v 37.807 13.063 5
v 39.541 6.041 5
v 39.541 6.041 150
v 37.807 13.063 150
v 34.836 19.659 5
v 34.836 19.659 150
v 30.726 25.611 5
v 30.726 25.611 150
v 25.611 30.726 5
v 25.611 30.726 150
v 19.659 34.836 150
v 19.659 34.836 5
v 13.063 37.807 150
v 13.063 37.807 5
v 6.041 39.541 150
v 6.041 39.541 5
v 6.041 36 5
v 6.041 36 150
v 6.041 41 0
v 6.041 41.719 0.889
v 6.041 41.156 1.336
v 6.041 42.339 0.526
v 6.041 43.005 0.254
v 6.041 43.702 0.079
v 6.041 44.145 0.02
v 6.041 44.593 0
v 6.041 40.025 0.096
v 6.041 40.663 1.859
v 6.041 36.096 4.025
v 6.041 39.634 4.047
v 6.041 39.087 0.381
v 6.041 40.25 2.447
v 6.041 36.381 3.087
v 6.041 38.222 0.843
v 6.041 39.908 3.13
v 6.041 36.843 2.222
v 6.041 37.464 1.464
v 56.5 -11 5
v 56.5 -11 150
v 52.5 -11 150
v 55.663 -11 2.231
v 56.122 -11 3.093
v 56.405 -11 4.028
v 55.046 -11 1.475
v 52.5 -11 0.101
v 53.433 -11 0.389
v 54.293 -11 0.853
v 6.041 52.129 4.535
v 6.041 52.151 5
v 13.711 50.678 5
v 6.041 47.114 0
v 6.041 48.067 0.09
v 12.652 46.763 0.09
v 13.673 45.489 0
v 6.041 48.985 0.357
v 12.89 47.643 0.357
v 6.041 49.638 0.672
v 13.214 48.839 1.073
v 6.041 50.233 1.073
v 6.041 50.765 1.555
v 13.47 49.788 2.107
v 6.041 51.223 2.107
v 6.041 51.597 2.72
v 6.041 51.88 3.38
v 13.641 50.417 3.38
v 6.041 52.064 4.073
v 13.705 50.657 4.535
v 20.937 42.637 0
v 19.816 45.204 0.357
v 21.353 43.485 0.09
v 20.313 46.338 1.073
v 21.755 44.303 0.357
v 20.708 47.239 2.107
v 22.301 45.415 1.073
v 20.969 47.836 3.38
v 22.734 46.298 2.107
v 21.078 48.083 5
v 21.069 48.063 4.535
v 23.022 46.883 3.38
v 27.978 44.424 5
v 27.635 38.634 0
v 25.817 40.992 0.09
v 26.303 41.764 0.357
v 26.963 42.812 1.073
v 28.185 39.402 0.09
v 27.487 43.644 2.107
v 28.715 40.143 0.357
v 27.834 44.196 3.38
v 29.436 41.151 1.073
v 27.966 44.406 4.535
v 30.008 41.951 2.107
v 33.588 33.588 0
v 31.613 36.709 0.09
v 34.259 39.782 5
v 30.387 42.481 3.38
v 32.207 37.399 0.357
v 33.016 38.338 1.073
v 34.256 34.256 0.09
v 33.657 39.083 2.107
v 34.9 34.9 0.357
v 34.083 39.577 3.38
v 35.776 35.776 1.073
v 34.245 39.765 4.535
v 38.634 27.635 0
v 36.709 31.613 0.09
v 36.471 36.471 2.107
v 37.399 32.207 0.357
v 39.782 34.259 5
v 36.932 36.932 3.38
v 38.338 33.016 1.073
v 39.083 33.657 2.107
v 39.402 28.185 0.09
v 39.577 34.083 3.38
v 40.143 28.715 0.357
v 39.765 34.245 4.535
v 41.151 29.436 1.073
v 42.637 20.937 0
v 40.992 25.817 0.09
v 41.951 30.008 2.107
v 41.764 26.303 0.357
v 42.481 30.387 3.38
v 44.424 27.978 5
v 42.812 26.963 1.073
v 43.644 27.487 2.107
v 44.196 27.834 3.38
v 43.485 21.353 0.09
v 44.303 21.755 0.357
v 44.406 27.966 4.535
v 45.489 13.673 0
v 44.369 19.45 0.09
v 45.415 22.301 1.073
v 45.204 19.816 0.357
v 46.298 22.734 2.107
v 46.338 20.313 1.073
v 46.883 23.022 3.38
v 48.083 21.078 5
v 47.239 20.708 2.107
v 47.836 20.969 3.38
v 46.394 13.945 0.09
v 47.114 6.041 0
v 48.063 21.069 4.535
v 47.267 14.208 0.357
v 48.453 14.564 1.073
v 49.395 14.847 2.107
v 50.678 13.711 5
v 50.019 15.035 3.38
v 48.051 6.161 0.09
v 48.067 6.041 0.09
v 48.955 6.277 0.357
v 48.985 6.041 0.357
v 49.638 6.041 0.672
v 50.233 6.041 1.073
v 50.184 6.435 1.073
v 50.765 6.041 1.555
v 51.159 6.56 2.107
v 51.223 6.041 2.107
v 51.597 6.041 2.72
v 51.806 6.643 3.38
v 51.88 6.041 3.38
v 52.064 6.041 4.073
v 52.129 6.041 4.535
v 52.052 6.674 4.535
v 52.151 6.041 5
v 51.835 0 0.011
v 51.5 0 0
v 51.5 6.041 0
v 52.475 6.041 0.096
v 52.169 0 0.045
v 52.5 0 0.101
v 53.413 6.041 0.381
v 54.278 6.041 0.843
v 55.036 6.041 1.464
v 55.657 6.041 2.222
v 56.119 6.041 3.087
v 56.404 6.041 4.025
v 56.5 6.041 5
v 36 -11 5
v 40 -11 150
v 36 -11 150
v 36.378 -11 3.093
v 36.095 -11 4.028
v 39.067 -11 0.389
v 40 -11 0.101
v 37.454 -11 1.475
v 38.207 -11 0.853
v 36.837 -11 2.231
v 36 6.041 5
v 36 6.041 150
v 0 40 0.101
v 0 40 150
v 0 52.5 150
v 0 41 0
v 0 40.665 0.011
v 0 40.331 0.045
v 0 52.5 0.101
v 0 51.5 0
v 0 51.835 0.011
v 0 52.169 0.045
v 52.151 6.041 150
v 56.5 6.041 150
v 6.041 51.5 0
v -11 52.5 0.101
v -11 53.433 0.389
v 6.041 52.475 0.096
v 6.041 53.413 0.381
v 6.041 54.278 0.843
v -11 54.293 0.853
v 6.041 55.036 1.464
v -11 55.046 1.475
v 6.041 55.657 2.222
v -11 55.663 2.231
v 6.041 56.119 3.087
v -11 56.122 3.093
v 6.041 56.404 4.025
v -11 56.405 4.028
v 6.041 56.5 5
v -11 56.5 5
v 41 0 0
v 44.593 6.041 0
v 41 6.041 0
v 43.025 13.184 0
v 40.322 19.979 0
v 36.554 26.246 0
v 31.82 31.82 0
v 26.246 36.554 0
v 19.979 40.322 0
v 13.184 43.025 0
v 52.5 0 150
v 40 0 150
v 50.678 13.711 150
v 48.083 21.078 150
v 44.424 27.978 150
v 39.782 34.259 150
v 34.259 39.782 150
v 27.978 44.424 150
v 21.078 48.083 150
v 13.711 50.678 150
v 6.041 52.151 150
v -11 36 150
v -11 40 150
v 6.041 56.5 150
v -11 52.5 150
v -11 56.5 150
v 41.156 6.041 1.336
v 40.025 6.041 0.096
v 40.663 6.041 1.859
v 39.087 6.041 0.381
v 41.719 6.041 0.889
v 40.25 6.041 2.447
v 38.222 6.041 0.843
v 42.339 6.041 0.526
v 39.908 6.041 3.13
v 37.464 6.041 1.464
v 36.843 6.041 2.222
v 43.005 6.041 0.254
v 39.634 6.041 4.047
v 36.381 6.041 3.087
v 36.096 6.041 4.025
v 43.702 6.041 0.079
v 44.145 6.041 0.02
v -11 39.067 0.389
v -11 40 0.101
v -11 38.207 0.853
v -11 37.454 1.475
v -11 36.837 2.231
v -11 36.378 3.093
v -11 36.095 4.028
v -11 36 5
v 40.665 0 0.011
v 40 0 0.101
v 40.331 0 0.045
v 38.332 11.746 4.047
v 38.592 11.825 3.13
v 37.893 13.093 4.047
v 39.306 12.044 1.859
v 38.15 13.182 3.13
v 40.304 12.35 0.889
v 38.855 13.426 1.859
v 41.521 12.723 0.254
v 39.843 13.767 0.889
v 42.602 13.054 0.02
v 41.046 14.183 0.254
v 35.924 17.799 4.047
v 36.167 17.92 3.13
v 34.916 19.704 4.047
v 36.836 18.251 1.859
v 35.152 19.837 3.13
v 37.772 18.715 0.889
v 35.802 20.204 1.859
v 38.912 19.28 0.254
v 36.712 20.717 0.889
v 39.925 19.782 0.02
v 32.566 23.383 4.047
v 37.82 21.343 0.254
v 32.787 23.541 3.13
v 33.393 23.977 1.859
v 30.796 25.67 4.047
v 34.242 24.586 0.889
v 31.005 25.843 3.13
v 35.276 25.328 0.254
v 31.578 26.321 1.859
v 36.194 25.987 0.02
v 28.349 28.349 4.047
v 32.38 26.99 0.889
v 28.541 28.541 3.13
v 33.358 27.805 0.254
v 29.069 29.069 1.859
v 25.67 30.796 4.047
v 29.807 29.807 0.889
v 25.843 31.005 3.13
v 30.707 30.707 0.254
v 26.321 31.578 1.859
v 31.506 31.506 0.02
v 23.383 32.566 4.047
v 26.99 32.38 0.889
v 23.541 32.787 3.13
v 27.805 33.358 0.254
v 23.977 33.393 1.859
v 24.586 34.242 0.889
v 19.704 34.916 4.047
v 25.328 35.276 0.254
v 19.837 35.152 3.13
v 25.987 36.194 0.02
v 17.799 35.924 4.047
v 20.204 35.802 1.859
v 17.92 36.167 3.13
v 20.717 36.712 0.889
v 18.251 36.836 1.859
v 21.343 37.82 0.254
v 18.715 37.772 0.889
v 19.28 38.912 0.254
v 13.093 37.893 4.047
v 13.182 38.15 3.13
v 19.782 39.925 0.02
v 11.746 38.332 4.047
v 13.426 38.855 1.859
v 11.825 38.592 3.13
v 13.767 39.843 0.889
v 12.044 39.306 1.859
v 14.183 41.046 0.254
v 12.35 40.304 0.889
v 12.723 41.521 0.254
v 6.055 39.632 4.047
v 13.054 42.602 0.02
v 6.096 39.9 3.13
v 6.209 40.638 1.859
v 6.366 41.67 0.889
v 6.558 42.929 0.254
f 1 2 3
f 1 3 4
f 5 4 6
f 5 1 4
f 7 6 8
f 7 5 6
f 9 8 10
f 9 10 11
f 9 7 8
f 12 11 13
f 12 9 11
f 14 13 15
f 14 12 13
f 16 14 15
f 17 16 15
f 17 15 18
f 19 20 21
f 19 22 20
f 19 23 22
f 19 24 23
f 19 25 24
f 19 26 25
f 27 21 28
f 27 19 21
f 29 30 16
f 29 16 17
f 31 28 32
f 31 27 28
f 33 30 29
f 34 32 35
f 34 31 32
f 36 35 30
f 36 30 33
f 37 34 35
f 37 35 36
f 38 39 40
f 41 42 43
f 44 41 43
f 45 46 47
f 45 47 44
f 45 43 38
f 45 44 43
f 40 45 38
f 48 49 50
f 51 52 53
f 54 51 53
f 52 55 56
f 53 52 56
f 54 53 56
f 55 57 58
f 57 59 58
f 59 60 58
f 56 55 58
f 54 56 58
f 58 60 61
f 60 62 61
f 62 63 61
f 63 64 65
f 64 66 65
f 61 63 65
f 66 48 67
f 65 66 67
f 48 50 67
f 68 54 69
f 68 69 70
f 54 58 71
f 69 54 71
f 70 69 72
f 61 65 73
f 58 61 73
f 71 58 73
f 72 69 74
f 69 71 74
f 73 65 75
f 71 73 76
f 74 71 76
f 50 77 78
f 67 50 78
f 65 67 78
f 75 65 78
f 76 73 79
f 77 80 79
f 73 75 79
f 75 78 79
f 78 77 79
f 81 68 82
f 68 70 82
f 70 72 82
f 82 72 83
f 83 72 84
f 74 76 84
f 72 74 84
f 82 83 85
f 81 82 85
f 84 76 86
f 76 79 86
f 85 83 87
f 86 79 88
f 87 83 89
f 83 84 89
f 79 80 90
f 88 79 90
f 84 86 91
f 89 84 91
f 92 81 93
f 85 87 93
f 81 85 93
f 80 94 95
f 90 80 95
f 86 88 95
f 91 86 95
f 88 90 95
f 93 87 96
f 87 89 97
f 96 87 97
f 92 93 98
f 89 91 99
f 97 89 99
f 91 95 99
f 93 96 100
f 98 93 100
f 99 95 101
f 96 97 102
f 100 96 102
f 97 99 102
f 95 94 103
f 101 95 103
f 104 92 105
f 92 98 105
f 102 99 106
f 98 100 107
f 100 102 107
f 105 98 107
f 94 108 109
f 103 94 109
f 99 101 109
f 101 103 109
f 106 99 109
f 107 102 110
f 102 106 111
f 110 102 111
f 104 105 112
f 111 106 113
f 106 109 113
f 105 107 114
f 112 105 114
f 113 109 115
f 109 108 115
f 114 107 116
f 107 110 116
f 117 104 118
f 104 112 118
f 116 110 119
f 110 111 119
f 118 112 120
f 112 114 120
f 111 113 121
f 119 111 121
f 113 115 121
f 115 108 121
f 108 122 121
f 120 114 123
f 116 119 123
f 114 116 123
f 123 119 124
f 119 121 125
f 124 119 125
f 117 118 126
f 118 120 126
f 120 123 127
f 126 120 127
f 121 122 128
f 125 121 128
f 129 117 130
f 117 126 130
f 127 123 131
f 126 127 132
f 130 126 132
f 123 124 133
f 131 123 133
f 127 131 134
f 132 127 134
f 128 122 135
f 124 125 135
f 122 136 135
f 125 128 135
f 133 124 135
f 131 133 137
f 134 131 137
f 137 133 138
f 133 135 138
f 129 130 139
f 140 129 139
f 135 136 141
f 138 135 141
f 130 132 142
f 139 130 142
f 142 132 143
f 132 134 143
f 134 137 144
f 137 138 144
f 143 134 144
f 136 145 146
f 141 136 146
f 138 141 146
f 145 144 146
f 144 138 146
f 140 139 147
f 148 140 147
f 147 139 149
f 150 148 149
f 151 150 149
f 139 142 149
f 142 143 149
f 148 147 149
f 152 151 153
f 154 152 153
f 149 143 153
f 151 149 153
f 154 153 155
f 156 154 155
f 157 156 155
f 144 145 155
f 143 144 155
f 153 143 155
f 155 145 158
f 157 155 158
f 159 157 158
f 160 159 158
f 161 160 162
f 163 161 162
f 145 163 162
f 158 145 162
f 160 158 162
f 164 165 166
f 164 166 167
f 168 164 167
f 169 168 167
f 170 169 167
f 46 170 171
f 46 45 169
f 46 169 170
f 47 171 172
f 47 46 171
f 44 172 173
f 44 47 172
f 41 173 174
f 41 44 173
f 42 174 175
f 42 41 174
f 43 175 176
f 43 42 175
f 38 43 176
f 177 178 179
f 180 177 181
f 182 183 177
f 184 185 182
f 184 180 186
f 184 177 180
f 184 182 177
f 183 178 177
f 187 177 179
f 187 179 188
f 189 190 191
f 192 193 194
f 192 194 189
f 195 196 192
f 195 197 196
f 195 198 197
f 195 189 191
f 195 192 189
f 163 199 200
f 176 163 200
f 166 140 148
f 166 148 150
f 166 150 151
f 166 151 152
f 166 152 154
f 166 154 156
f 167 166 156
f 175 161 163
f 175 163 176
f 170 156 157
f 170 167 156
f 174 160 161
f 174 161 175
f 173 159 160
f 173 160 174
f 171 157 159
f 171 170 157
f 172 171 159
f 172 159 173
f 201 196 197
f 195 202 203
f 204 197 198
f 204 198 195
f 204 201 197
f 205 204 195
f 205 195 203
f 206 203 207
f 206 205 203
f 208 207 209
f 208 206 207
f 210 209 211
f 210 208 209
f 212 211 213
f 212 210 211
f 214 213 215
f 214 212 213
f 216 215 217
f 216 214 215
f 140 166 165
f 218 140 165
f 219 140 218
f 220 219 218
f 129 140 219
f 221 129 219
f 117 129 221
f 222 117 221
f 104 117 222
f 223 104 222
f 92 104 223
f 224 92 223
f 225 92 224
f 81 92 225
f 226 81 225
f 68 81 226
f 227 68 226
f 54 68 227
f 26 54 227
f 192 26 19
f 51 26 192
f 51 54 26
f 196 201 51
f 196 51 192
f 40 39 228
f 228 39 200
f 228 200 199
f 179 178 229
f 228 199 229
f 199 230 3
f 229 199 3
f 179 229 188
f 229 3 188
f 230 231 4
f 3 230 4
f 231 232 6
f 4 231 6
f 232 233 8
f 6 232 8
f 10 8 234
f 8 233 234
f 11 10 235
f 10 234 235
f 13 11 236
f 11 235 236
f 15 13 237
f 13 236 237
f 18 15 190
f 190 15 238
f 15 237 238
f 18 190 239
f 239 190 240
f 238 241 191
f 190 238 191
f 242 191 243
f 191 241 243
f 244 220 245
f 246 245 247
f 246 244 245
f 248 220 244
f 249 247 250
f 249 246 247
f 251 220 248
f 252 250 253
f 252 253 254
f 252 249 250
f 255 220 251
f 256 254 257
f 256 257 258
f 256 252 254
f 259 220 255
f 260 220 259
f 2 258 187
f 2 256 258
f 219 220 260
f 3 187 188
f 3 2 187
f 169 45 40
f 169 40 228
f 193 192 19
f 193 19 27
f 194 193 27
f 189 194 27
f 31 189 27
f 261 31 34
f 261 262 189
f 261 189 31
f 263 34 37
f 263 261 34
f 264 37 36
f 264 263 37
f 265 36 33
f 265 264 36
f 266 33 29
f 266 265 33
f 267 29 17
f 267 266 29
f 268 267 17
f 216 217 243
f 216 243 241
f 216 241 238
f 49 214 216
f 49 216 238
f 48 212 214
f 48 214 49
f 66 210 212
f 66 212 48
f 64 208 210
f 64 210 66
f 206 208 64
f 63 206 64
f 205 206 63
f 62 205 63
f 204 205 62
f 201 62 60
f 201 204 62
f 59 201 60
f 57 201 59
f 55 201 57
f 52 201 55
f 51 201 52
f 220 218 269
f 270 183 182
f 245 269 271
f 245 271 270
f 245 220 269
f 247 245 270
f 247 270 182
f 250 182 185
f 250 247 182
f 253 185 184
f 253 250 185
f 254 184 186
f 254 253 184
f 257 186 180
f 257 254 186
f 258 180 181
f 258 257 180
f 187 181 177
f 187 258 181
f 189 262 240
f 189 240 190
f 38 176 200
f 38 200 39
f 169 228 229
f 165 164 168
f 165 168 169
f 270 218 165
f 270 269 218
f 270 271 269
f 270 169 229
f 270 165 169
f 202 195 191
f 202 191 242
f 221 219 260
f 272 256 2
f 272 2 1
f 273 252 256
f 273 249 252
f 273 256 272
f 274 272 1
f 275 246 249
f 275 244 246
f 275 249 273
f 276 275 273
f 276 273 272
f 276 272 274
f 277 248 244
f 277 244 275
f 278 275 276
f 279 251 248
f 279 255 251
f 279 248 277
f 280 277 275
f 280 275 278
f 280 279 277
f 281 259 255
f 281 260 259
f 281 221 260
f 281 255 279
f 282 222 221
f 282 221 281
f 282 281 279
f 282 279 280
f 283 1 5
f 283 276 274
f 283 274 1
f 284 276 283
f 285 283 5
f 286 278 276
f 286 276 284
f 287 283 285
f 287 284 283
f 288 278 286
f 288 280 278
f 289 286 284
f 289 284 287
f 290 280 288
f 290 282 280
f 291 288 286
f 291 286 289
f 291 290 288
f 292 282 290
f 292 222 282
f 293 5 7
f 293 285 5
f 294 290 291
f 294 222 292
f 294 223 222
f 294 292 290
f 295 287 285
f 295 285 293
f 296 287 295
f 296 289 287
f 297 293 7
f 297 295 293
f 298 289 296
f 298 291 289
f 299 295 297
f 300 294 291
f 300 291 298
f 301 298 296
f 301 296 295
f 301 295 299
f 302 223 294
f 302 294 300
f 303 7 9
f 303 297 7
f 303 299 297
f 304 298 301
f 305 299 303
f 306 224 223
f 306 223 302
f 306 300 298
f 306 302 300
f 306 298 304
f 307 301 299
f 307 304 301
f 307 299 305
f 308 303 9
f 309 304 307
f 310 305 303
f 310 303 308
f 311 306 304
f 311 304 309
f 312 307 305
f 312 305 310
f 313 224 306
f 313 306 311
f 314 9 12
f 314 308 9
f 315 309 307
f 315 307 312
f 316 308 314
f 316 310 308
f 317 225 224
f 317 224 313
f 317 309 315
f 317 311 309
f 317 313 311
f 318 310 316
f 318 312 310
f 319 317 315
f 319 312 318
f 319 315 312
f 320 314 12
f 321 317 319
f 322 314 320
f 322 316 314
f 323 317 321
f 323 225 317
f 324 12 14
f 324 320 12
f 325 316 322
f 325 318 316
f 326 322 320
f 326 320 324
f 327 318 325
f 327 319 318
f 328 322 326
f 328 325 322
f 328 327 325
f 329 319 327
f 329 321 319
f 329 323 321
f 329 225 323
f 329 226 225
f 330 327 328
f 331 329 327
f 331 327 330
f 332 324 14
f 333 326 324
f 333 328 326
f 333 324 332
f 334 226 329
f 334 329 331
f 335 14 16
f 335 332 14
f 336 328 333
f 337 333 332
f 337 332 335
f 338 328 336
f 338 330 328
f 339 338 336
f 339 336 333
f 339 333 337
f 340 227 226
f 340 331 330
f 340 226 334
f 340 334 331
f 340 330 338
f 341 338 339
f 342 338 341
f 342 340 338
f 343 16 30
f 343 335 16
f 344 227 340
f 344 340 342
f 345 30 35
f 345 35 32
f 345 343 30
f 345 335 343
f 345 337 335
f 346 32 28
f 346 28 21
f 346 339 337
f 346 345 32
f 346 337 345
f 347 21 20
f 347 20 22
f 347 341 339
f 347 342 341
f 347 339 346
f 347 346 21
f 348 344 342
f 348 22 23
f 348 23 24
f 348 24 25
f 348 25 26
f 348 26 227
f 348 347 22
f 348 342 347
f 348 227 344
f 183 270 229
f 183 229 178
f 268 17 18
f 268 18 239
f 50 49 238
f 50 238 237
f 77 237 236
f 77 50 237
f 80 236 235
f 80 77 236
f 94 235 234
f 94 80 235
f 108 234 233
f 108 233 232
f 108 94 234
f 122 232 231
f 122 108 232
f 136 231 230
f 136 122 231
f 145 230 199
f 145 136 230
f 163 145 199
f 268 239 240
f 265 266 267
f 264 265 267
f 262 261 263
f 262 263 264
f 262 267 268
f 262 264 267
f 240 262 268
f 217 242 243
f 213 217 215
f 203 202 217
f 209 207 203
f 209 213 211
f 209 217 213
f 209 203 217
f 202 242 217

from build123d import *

# Parameters (mm, degrees)
EXTRUDE_1_DEPTH = 150
EXTRUDE_2_DEPTH = 150
FILLET_1_R      = 5
FILLET_2_R      = 5
FILLET_3_R      = 5
FILLET_4_R      = 5
FILLET_5_R      = 5


with BuildPart() as part:
    # 草图1 → 凸台-拉伸1 (new body)
    with BuildSketch(Plane.XY):
        with BuildLine():
            Line((0, 40), (0, 52.5))
            ThreePointArc((0, 52.5), (37.123106012, 37.123106012), (52.5, 0))
            Line((52.5, 0), (40, 0))
            ThreePointArc((40, 0), (28.284271247, 28.284271247), (0, 40))
        make_face()
    extrude(amount=EXTRUDE_1_DEPTH)

    # 草图2 → 凸台-拉伸2 (add)
    with BuildSketch(Plane(origin=(0, 0, 0), x_dir=(-1, 0, 0), z_dir=(0, 0, -1))):
        Polygon((11, 52.5), (11, 56.5), (-6.040960951, 56.5), (-6.040960951, 36), (11, 36), (11, 40), (0, 40), (0, 52.5), align=None)
        Polygon((-52.5, -11), (-52.5, 0), (-40, 0), (-40, -11), (-36, -11), (-36, 6.040960951), (-56.5, 6.040960951), (-56.5, -11), align=None)
    extrude(amount=-EXTRUDE_2_DEPTH)

    # 圆角1
    fillet_1_edges = [part.edges().sort_by_distance(p)[0] for p in [
        (37.123106012, 37.123106012, 0),
    ]]
    fillet(fillet_1_edges, radius=FILLET_1_R)

    # 圆角2
    # the kernel refuses this fillet: 5 mm, written as the material it takes off along each edge
    with BuildSketch(Plane(origin=(0, 0, 0), x_dir=(0.9870710552033948, -0.1602832866510314, 0), z_dir=(-0.1602832866510314, -0.9870710552033948, 0))) as fillet_2_piece_1_section:
        with BuildLine():
            CenterArc((40 + FILLET_2_R, FILLET_2_R), FILLET_2_R, 180, 90)
            Line((40, FILLET_2_R), (40, 0))
            Line((40, 0), (40 + FILLET_2_R, 0))
        make_face()
    fillet_2_piece_1 = revolve(axis=Axis((0, 0, 0), (0, 0, 1)), revolution_arc=108.446679136, mode=Mode.PRIVATE)
    fillet_2_piece_1 = split(fillet_2_piece_1, bisect_by=Plane(origin=(6.040960951, 29.285093623, 1.415376577), z_dir=(1, 0, 0)), keep=Keep.TOP, mode=Mode.PRIVATE)
    fillet_2_piece_1 = split(fillet_2_piece_1, bisect_by=Plane(origin=(29.285093623, 6.040960951, 1.415376577), z_dir=(0, 1, 0)), keep=Keep.TOP, mode=Mode.PRIVATE)
    add(fillet_2_piece_1, mode=Mode.SUBTRACT)

    # 圆角3
    fillet_3_edges = [part.edges().sort_by_distance(p)[0] for p in [
        (-2.479519525, 56.5, 0),
    ]]
    fillet(fillet_3_edges, radius=FILLET_3_R)

    # 圆角4
    fillet_4_edges = [part.edges().sort_by_distance(p)[0] for p in [
        (56.5, -2.479519525, 0),
        (-2.479519525, 36, 0),
    ]]
    fillet(fillet_4_edges, radius=FILLET_4_R)

    # 圆角5
    fillet_5_edges = [part.edges().sort_by_distance(p)[0] for p in [
        (36, -2.479519525, 0),
    ]]
    fillet(fillet_5_edges, radius=FILLET_5_R)


solid = part.part
